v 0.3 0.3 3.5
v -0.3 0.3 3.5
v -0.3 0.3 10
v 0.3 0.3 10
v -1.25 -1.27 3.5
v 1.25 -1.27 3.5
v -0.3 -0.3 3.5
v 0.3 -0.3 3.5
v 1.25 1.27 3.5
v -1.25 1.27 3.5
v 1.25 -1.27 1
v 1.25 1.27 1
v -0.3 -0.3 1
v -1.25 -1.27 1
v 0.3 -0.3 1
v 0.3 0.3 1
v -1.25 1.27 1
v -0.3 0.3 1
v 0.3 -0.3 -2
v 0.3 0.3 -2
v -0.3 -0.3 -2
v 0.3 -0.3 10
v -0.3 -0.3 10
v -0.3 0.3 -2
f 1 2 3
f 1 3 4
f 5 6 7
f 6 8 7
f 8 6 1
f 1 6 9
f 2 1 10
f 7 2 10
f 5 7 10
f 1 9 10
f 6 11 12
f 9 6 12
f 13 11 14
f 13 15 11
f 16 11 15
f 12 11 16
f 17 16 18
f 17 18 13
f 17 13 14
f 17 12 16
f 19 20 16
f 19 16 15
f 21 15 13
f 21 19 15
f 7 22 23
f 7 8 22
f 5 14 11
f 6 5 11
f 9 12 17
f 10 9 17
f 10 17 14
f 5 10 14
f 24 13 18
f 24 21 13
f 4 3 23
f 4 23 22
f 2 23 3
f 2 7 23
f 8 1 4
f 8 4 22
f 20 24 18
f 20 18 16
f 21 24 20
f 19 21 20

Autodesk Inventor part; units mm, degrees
ref_plane "YZ Plane" through (0, 0, 0) normal (1, 0, 0) x (0, 1, 0)
ref_plane "XZ Plane" through (0, 0, 0) normal (0, 1, 0) x (-1, 0, 0)
ref_plane "XY Plane" through (0, 0, 0) normal (0, 0, 1) x (1, 0, 0)
sketch "Sketch2" plane through (0, 0, 0) normal (0, 0, 1) x (1, 0, 0)
  line L0 (-0.3, 0.3) -> (0.3, 0.3)
  line L1 (0.3, 0.3) -> (0.3, -0.3)
  line L2 (0.3, -0.3) -> (-0.3, -0.3)
  line L3 (-0.3, -0.3) -> (-0.3, 0.3)
  line L4 (-0.3, 0.3) -> (0.3, -0.3) construction
  line L5 (0.3, 0.3) -> (-0.3, -0.3) construction
  point P0 (0, 0)
  dimension "d2" = 0.6
  dimension "d3" = 0.6
extrude "Extrusion1" add sketch "Sketch2" along normal blind 10 and the other way blind 2
sketch "Sketch3" plane through (0, 0, -2) normal (0, 0, -1) x (-1, 0, 0)
  line L0 (-0.3, -0.3) -> (0.3, -0.3) projected
  line L1 (0.3, -0.3) -> (0.3, 0.3) projected
  line L2 (0.3, 0.3) -> (-0.3, 0.3) projected
  line L3 (-0.3, 0.3) -> (-0.3, -0.3) projected
  line L4 (-1.25, 1.27) -> (1.25, 1.27)
  line L5 (1.25, 1.27) -> (1.25, -1.27)
  line L6 (1.25, -1.27) -> (-1.25, -1.27)
  line L7 (-1.25, -1.27) -> (-1.25, 1.27)
  line L8 (-1.25, 1.27) -> (1.25, -1.27) construction
  line L9 (1.25, 1.27) -> (-1.25, -1.27) construction
  point P0 (0, 0)
  dimension "d8" = 2.54
  dimension "d9" = 2.5
ref_plane "Work Plane1" through (0, 0, 1) normal (0, 0, -1) x (-1, 0, 0)
extrude "Extrusion2" add sketch "Sketch3" against normal blind 2.5 from surface at -3
properties part number "Header D1"
